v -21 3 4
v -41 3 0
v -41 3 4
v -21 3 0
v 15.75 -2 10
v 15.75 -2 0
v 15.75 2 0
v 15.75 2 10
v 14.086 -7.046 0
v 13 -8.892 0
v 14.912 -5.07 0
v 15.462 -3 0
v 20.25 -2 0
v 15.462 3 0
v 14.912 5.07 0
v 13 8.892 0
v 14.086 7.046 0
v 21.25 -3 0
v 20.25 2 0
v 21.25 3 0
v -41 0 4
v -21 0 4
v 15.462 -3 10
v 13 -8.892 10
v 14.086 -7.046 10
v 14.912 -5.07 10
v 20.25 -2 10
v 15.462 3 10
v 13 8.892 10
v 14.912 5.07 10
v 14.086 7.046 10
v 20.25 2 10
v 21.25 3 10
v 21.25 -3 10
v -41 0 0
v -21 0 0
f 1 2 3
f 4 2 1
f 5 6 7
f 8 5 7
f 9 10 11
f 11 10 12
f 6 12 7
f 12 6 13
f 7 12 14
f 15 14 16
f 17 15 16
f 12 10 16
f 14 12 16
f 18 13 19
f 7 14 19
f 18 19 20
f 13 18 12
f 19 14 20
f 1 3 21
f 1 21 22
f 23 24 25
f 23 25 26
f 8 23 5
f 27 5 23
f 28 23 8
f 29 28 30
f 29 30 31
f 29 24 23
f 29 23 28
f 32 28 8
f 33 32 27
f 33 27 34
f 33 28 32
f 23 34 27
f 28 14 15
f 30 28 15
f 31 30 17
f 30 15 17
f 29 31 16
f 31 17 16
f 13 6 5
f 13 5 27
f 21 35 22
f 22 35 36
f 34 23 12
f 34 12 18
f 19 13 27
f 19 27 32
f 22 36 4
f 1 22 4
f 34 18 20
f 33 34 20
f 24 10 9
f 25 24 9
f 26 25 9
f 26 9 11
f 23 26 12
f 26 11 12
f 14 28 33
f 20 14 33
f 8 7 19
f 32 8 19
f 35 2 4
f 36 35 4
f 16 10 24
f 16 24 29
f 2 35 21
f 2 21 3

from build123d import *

# Parameters (mm, degrees)
CYLINDER_R     = 15.75
CYLINDER_DEPTH = 10
BOX_W          = 7.5
BOX_H          = 6
BOX_DEPTH      = 10
BOX001_W       = 4.5
BOX001_H       = 4
BOX001_DEPTH   = 10
BOX003_W       = 30
BOX003_H       = 35
BOX003_DEPTH   = 10
BOX002_W       = 20
BOX002_H       = 3
BOX002_DEPTH   = 4


with BuildPart() as body:
    # Cylinder → Cylinder (join)
    with BuildSketch(Plane.XY):
        Circle(CYLINDER_R)
    extrude(amount=CYLINDER_DEPTH)

    # Box → Box (join)
    with BuildSketch(Plane(origin=(13.75, -3, 0), x_dir=(1, 0, 0), z_dir=(0, 0, 1))):
        with Locations((3.75, 3)):
            Rectangle(BOX_W, BOX_H)
    extrude(amount=BOX_DEPTH)

    # Box001 → Box001 (cut)
    with BuildSketch(Plane(origin=(15.75, -2, 0), x_dir=(1, 0, 0), z_dir=(0, 0, 1))):
        with Locations((2.25, 2)):
            Rectangle(BOX001_W, BOX001_H)
    extrude(amount=BOX001_DEPTH, mode=Mode.SUBTRACT)

    # Box003 → Box003 (cut)
    with BuildSketch(Plane(origin=(-17, -17, 0), x_dir=(1, 0, 0), z_dir=(0, 0, 1))):
        with Locations((15, 17.5)):
            Rectangle(BOX003_W, BOX003_H)
    extrude(amount=BOX003_DEPTH, mode=Mode.SUBTRACT)


with BuildPart() as body001:
    # Box002 → Box002 (join)
    with BuildSketch(Plane(origin=(-41, 0, 0), x_dir=(1, 0, 0), z_dir=(0, 0, 1))):
        with Locations((10, 1.5)):
            Rectangle(BOX002_W, BOX002_H)
    extrude(amount=BOX002_DEPTH)


solid = Compound([body.part, body001.part])
